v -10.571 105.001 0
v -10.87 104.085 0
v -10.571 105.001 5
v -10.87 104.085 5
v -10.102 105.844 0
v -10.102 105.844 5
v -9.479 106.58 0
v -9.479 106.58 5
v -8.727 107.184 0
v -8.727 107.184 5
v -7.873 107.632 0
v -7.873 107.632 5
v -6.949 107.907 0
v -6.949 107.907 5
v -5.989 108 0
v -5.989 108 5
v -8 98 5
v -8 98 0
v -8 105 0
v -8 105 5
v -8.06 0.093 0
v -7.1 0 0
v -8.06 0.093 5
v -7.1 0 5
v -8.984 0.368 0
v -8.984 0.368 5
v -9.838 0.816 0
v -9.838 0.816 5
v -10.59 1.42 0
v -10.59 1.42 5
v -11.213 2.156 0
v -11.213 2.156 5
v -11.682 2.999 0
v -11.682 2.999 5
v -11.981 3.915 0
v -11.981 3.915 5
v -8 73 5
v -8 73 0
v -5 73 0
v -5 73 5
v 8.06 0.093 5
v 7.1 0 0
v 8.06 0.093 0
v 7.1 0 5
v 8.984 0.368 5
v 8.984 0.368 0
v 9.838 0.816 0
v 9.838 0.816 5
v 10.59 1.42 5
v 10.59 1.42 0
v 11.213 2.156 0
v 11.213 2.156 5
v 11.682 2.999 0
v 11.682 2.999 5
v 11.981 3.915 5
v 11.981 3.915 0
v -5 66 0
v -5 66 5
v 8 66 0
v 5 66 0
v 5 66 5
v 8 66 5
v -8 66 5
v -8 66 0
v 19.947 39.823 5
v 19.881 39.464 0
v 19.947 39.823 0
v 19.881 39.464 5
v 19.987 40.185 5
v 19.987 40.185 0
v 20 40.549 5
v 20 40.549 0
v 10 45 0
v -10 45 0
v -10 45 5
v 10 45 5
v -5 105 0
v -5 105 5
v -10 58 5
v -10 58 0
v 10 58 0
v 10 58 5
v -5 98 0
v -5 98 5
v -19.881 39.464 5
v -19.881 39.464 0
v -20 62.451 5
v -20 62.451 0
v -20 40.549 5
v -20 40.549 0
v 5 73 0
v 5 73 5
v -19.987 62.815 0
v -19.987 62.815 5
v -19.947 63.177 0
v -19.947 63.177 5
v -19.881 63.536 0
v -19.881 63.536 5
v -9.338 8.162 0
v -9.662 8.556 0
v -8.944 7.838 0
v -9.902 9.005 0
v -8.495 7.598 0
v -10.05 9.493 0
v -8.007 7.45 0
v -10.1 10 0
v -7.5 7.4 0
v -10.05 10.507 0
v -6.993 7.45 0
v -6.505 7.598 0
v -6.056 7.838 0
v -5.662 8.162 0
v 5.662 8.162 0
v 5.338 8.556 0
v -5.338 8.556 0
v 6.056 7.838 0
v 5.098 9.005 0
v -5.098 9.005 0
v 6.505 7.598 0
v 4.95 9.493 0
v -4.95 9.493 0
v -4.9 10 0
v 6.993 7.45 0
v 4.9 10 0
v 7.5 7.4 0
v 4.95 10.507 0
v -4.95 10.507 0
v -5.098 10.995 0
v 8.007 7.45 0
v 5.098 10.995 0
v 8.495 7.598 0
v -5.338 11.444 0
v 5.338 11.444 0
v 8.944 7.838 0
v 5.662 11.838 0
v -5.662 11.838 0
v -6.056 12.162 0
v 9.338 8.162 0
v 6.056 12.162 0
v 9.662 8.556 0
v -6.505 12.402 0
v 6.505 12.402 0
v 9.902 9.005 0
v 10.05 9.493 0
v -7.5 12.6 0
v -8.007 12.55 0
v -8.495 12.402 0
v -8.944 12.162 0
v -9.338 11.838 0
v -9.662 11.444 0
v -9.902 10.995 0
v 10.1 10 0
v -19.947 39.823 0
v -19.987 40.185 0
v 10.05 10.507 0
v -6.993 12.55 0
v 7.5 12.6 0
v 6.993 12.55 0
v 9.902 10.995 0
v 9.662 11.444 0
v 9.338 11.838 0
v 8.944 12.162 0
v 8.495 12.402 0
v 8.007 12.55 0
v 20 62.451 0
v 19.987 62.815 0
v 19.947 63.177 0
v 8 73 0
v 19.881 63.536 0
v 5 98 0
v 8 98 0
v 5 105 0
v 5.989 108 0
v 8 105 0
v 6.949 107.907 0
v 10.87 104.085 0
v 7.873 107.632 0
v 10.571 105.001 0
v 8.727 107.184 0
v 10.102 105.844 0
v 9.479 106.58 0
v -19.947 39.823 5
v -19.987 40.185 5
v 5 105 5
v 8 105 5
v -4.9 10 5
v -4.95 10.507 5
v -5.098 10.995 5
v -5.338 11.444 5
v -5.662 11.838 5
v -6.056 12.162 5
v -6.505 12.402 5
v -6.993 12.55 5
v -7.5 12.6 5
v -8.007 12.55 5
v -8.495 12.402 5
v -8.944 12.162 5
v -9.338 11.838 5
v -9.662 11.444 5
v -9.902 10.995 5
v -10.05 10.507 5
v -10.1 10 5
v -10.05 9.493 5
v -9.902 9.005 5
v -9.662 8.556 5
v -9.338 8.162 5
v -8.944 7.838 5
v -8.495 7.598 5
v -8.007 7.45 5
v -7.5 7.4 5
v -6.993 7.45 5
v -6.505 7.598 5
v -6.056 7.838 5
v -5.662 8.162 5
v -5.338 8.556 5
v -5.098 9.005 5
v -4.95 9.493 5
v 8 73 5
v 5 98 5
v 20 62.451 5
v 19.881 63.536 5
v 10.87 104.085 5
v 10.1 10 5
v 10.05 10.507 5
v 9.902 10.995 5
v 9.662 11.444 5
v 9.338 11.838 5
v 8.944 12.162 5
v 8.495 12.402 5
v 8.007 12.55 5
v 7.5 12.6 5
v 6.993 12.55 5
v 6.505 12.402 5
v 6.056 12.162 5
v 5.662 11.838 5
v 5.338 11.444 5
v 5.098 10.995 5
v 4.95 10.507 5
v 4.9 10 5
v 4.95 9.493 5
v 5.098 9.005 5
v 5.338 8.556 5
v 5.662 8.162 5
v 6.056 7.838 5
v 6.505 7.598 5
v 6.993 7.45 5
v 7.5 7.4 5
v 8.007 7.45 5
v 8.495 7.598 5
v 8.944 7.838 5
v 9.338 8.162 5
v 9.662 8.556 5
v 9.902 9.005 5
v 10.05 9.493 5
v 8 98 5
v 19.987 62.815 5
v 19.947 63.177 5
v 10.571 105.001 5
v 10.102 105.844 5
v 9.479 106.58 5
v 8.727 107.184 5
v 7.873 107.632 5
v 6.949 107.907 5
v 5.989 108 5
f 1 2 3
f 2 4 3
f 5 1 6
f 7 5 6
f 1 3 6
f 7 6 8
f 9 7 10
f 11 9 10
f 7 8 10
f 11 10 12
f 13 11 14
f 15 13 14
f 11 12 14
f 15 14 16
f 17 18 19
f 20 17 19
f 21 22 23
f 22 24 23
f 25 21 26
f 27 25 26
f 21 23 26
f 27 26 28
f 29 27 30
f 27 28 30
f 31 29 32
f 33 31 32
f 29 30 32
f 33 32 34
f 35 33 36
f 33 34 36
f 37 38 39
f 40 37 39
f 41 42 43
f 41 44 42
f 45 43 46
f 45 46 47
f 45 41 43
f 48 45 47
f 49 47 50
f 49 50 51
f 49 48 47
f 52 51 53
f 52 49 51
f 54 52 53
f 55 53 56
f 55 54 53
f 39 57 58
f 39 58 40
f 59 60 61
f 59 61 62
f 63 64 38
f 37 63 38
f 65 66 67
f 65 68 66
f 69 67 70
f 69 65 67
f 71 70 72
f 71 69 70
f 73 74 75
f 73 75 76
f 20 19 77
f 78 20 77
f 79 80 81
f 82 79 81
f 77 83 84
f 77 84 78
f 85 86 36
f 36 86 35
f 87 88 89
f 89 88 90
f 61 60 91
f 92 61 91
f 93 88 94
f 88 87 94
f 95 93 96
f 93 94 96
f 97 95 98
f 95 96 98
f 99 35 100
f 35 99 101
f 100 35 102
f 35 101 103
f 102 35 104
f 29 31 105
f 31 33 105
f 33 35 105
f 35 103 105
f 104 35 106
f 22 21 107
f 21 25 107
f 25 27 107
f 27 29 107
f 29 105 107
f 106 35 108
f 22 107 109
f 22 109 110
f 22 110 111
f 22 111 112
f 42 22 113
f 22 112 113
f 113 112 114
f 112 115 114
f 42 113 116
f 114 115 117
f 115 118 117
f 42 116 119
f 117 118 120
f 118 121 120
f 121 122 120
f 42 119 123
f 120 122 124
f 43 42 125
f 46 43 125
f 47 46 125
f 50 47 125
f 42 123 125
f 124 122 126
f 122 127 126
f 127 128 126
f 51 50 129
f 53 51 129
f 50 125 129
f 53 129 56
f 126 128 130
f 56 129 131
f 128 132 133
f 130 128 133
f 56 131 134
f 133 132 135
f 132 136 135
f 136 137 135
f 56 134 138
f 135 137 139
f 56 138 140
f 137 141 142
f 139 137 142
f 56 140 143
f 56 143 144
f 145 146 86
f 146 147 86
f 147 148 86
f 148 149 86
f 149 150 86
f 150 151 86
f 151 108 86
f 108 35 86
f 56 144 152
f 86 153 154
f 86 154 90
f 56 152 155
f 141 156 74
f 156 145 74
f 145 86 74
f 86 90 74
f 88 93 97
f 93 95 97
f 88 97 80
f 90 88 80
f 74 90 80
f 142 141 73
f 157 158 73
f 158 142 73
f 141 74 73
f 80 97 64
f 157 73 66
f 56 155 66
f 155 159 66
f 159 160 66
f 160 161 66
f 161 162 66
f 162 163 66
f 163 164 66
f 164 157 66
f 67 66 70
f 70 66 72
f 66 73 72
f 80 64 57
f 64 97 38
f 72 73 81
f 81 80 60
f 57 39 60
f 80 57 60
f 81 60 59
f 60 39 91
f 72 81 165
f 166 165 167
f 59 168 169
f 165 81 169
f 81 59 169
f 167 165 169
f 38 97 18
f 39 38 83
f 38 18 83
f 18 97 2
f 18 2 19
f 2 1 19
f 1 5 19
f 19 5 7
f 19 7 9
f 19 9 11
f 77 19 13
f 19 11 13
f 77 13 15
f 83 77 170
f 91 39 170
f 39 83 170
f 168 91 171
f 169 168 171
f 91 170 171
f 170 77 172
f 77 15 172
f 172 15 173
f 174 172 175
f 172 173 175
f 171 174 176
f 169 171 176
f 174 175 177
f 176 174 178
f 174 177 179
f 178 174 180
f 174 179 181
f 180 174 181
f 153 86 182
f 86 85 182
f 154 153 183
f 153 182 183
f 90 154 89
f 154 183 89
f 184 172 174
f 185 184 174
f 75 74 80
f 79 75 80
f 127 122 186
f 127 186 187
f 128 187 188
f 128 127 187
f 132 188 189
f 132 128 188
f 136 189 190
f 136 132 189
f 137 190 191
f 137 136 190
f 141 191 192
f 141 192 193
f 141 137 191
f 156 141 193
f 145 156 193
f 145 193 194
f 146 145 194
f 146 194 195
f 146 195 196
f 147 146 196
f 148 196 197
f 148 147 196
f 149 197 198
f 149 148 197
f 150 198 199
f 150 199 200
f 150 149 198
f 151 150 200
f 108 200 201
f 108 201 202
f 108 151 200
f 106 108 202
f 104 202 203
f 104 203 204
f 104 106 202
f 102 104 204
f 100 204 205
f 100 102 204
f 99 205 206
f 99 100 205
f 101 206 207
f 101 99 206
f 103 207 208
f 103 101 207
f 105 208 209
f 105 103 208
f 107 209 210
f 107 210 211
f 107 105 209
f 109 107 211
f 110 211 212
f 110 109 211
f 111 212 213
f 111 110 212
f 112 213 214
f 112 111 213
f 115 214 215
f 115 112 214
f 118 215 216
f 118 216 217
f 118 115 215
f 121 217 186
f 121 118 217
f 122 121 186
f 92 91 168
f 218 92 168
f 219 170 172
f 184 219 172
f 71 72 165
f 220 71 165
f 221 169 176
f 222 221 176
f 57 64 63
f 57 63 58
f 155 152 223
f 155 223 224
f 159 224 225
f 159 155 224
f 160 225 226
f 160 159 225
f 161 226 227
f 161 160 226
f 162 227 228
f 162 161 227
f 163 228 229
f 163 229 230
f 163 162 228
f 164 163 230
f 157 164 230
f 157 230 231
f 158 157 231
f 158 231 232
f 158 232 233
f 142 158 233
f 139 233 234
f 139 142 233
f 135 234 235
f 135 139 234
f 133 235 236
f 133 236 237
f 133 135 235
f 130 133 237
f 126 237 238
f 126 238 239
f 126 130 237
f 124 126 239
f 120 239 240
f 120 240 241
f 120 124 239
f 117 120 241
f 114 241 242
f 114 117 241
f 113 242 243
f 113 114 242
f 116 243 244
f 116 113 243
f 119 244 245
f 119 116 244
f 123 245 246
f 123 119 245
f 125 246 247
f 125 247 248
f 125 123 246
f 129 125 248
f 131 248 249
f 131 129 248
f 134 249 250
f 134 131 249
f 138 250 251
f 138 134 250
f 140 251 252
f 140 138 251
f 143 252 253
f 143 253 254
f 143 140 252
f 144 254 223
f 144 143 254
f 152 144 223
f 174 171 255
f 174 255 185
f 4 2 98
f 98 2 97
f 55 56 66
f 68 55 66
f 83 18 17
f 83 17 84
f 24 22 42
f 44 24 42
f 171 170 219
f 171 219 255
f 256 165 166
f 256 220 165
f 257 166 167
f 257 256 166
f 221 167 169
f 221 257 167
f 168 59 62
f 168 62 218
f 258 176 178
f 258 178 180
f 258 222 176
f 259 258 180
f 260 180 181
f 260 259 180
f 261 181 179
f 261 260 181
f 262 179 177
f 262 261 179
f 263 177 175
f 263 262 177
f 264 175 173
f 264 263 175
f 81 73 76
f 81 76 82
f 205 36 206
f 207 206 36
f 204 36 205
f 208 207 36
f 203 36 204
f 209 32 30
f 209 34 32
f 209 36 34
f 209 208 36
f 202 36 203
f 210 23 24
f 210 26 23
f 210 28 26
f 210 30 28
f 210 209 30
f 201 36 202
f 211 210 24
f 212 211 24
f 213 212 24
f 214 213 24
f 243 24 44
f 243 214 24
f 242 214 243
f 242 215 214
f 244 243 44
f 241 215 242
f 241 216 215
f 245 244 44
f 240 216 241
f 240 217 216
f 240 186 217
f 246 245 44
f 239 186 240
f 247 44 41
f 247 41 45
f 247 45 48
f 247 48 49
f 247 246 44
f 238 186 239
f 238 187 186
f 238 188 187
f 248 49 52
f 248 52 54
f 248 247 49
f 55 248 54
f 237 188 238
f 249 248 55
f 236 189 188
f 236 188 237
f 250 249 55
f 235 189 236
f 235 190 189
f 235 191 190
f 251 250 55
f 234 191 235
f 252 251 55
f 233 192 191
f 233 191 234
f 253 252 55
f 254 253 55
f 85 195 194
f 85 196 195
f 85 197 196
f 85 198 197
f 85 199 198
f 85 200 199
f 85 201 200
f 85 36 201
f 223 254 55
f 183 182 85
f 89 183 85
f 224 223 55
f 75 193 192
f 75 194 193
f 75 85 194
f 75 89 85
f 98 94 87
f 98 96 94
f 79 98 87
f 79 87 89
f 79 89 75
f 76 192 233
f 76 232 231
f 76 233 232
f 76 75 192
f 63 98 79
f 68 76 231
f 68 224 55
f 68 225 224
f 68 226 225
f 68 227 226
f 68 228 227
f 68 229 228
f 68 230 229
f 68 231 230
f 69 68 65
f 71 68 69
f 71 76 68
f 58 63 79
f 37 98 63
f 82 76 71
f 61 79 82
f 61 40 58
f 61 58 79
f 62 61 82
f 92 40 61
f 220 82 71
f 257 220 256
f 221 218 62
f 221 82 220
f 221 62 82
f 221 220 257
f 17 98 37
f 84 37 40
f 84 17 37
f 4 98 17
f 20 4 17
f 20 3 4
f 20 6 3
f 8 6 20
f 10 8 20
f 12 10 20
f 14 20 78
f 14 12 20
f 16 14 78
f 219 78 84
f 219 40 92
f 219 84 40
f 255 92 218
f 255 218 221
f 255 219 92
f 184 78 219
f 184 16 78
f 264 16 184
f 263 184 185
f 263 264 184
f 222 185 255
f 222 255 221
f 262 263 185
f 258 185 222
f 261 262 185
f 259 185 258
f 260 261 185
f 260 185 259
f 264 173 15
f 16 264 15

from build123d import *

# Parameters (mm, degrees)
SKETCH_R   = 2.6
SKETCH_W   = 3
SKETCH_H   = 7
SKETCH_W_2 = 20
SKETCH_H_2 = 13
PAD_DEPTH  = 5
FILLET_R   = 5


with BuildPart() as part:
    # Sketch → Pad (new body)
    with BuildSketch(Plane.XY):
        Polygon((-11.11097, 0), (11.11097, 0), (20, 40), (20, 63), (10, 108), (-10, 108), (-20, 63), (-20, 40), align=None)
        with Locations((7.5, 10)):
            Circle(SKETCH_R, mode=Mode.SUBTRACT)
        with Locations((-7.5, 10)):
            Circle(SKETCH_R, mode=Mode.SUBTRACT)
        with Locations((-6.5, 101.5)):
            Rectangle(SKETCH_W, SKETCH_H, mode=Mode.SUBTRACT)
        with Locations((6.5, 101.5)):
            Rectangle(SKETCH_W, SKETCH_H, mode=Mode.SUBTRACT)
        with Locations((0, 51.5)):
            Rectangle(SKETCH_W_2, SKETCH_H_2, mode=Mode.SUBTRACT)
        with Locations((-6.5, 69.5)):
            Rectangle(SKETCH_W, SKETCH_H, mode=Mode.SUBTRACT)
        with Locations((6.5, 69.5)):
            Rectangle(SKETCH_W, SKETCH_H, mode=Mode.SUBTRACT)
    extrude(amount=PAD_DEPTH)

    # Fillet
    fillet_edges = [part.edges().sort_by_distance(p)[0] for p in [
        (10, 108, 2.5),
        (-10, 108, 2.5),
        (20, 63, 2.5),
        (20, 40, 2.5),
        (11.11097, 0, 2.5),
        (-11.11097, 0, 2.5),
        (-20, 40, 2.5),
        (-20, 63, 2.5),
    ]]
    fillet(fillet_edges, radius=FILLET_R)


solid = part.part
